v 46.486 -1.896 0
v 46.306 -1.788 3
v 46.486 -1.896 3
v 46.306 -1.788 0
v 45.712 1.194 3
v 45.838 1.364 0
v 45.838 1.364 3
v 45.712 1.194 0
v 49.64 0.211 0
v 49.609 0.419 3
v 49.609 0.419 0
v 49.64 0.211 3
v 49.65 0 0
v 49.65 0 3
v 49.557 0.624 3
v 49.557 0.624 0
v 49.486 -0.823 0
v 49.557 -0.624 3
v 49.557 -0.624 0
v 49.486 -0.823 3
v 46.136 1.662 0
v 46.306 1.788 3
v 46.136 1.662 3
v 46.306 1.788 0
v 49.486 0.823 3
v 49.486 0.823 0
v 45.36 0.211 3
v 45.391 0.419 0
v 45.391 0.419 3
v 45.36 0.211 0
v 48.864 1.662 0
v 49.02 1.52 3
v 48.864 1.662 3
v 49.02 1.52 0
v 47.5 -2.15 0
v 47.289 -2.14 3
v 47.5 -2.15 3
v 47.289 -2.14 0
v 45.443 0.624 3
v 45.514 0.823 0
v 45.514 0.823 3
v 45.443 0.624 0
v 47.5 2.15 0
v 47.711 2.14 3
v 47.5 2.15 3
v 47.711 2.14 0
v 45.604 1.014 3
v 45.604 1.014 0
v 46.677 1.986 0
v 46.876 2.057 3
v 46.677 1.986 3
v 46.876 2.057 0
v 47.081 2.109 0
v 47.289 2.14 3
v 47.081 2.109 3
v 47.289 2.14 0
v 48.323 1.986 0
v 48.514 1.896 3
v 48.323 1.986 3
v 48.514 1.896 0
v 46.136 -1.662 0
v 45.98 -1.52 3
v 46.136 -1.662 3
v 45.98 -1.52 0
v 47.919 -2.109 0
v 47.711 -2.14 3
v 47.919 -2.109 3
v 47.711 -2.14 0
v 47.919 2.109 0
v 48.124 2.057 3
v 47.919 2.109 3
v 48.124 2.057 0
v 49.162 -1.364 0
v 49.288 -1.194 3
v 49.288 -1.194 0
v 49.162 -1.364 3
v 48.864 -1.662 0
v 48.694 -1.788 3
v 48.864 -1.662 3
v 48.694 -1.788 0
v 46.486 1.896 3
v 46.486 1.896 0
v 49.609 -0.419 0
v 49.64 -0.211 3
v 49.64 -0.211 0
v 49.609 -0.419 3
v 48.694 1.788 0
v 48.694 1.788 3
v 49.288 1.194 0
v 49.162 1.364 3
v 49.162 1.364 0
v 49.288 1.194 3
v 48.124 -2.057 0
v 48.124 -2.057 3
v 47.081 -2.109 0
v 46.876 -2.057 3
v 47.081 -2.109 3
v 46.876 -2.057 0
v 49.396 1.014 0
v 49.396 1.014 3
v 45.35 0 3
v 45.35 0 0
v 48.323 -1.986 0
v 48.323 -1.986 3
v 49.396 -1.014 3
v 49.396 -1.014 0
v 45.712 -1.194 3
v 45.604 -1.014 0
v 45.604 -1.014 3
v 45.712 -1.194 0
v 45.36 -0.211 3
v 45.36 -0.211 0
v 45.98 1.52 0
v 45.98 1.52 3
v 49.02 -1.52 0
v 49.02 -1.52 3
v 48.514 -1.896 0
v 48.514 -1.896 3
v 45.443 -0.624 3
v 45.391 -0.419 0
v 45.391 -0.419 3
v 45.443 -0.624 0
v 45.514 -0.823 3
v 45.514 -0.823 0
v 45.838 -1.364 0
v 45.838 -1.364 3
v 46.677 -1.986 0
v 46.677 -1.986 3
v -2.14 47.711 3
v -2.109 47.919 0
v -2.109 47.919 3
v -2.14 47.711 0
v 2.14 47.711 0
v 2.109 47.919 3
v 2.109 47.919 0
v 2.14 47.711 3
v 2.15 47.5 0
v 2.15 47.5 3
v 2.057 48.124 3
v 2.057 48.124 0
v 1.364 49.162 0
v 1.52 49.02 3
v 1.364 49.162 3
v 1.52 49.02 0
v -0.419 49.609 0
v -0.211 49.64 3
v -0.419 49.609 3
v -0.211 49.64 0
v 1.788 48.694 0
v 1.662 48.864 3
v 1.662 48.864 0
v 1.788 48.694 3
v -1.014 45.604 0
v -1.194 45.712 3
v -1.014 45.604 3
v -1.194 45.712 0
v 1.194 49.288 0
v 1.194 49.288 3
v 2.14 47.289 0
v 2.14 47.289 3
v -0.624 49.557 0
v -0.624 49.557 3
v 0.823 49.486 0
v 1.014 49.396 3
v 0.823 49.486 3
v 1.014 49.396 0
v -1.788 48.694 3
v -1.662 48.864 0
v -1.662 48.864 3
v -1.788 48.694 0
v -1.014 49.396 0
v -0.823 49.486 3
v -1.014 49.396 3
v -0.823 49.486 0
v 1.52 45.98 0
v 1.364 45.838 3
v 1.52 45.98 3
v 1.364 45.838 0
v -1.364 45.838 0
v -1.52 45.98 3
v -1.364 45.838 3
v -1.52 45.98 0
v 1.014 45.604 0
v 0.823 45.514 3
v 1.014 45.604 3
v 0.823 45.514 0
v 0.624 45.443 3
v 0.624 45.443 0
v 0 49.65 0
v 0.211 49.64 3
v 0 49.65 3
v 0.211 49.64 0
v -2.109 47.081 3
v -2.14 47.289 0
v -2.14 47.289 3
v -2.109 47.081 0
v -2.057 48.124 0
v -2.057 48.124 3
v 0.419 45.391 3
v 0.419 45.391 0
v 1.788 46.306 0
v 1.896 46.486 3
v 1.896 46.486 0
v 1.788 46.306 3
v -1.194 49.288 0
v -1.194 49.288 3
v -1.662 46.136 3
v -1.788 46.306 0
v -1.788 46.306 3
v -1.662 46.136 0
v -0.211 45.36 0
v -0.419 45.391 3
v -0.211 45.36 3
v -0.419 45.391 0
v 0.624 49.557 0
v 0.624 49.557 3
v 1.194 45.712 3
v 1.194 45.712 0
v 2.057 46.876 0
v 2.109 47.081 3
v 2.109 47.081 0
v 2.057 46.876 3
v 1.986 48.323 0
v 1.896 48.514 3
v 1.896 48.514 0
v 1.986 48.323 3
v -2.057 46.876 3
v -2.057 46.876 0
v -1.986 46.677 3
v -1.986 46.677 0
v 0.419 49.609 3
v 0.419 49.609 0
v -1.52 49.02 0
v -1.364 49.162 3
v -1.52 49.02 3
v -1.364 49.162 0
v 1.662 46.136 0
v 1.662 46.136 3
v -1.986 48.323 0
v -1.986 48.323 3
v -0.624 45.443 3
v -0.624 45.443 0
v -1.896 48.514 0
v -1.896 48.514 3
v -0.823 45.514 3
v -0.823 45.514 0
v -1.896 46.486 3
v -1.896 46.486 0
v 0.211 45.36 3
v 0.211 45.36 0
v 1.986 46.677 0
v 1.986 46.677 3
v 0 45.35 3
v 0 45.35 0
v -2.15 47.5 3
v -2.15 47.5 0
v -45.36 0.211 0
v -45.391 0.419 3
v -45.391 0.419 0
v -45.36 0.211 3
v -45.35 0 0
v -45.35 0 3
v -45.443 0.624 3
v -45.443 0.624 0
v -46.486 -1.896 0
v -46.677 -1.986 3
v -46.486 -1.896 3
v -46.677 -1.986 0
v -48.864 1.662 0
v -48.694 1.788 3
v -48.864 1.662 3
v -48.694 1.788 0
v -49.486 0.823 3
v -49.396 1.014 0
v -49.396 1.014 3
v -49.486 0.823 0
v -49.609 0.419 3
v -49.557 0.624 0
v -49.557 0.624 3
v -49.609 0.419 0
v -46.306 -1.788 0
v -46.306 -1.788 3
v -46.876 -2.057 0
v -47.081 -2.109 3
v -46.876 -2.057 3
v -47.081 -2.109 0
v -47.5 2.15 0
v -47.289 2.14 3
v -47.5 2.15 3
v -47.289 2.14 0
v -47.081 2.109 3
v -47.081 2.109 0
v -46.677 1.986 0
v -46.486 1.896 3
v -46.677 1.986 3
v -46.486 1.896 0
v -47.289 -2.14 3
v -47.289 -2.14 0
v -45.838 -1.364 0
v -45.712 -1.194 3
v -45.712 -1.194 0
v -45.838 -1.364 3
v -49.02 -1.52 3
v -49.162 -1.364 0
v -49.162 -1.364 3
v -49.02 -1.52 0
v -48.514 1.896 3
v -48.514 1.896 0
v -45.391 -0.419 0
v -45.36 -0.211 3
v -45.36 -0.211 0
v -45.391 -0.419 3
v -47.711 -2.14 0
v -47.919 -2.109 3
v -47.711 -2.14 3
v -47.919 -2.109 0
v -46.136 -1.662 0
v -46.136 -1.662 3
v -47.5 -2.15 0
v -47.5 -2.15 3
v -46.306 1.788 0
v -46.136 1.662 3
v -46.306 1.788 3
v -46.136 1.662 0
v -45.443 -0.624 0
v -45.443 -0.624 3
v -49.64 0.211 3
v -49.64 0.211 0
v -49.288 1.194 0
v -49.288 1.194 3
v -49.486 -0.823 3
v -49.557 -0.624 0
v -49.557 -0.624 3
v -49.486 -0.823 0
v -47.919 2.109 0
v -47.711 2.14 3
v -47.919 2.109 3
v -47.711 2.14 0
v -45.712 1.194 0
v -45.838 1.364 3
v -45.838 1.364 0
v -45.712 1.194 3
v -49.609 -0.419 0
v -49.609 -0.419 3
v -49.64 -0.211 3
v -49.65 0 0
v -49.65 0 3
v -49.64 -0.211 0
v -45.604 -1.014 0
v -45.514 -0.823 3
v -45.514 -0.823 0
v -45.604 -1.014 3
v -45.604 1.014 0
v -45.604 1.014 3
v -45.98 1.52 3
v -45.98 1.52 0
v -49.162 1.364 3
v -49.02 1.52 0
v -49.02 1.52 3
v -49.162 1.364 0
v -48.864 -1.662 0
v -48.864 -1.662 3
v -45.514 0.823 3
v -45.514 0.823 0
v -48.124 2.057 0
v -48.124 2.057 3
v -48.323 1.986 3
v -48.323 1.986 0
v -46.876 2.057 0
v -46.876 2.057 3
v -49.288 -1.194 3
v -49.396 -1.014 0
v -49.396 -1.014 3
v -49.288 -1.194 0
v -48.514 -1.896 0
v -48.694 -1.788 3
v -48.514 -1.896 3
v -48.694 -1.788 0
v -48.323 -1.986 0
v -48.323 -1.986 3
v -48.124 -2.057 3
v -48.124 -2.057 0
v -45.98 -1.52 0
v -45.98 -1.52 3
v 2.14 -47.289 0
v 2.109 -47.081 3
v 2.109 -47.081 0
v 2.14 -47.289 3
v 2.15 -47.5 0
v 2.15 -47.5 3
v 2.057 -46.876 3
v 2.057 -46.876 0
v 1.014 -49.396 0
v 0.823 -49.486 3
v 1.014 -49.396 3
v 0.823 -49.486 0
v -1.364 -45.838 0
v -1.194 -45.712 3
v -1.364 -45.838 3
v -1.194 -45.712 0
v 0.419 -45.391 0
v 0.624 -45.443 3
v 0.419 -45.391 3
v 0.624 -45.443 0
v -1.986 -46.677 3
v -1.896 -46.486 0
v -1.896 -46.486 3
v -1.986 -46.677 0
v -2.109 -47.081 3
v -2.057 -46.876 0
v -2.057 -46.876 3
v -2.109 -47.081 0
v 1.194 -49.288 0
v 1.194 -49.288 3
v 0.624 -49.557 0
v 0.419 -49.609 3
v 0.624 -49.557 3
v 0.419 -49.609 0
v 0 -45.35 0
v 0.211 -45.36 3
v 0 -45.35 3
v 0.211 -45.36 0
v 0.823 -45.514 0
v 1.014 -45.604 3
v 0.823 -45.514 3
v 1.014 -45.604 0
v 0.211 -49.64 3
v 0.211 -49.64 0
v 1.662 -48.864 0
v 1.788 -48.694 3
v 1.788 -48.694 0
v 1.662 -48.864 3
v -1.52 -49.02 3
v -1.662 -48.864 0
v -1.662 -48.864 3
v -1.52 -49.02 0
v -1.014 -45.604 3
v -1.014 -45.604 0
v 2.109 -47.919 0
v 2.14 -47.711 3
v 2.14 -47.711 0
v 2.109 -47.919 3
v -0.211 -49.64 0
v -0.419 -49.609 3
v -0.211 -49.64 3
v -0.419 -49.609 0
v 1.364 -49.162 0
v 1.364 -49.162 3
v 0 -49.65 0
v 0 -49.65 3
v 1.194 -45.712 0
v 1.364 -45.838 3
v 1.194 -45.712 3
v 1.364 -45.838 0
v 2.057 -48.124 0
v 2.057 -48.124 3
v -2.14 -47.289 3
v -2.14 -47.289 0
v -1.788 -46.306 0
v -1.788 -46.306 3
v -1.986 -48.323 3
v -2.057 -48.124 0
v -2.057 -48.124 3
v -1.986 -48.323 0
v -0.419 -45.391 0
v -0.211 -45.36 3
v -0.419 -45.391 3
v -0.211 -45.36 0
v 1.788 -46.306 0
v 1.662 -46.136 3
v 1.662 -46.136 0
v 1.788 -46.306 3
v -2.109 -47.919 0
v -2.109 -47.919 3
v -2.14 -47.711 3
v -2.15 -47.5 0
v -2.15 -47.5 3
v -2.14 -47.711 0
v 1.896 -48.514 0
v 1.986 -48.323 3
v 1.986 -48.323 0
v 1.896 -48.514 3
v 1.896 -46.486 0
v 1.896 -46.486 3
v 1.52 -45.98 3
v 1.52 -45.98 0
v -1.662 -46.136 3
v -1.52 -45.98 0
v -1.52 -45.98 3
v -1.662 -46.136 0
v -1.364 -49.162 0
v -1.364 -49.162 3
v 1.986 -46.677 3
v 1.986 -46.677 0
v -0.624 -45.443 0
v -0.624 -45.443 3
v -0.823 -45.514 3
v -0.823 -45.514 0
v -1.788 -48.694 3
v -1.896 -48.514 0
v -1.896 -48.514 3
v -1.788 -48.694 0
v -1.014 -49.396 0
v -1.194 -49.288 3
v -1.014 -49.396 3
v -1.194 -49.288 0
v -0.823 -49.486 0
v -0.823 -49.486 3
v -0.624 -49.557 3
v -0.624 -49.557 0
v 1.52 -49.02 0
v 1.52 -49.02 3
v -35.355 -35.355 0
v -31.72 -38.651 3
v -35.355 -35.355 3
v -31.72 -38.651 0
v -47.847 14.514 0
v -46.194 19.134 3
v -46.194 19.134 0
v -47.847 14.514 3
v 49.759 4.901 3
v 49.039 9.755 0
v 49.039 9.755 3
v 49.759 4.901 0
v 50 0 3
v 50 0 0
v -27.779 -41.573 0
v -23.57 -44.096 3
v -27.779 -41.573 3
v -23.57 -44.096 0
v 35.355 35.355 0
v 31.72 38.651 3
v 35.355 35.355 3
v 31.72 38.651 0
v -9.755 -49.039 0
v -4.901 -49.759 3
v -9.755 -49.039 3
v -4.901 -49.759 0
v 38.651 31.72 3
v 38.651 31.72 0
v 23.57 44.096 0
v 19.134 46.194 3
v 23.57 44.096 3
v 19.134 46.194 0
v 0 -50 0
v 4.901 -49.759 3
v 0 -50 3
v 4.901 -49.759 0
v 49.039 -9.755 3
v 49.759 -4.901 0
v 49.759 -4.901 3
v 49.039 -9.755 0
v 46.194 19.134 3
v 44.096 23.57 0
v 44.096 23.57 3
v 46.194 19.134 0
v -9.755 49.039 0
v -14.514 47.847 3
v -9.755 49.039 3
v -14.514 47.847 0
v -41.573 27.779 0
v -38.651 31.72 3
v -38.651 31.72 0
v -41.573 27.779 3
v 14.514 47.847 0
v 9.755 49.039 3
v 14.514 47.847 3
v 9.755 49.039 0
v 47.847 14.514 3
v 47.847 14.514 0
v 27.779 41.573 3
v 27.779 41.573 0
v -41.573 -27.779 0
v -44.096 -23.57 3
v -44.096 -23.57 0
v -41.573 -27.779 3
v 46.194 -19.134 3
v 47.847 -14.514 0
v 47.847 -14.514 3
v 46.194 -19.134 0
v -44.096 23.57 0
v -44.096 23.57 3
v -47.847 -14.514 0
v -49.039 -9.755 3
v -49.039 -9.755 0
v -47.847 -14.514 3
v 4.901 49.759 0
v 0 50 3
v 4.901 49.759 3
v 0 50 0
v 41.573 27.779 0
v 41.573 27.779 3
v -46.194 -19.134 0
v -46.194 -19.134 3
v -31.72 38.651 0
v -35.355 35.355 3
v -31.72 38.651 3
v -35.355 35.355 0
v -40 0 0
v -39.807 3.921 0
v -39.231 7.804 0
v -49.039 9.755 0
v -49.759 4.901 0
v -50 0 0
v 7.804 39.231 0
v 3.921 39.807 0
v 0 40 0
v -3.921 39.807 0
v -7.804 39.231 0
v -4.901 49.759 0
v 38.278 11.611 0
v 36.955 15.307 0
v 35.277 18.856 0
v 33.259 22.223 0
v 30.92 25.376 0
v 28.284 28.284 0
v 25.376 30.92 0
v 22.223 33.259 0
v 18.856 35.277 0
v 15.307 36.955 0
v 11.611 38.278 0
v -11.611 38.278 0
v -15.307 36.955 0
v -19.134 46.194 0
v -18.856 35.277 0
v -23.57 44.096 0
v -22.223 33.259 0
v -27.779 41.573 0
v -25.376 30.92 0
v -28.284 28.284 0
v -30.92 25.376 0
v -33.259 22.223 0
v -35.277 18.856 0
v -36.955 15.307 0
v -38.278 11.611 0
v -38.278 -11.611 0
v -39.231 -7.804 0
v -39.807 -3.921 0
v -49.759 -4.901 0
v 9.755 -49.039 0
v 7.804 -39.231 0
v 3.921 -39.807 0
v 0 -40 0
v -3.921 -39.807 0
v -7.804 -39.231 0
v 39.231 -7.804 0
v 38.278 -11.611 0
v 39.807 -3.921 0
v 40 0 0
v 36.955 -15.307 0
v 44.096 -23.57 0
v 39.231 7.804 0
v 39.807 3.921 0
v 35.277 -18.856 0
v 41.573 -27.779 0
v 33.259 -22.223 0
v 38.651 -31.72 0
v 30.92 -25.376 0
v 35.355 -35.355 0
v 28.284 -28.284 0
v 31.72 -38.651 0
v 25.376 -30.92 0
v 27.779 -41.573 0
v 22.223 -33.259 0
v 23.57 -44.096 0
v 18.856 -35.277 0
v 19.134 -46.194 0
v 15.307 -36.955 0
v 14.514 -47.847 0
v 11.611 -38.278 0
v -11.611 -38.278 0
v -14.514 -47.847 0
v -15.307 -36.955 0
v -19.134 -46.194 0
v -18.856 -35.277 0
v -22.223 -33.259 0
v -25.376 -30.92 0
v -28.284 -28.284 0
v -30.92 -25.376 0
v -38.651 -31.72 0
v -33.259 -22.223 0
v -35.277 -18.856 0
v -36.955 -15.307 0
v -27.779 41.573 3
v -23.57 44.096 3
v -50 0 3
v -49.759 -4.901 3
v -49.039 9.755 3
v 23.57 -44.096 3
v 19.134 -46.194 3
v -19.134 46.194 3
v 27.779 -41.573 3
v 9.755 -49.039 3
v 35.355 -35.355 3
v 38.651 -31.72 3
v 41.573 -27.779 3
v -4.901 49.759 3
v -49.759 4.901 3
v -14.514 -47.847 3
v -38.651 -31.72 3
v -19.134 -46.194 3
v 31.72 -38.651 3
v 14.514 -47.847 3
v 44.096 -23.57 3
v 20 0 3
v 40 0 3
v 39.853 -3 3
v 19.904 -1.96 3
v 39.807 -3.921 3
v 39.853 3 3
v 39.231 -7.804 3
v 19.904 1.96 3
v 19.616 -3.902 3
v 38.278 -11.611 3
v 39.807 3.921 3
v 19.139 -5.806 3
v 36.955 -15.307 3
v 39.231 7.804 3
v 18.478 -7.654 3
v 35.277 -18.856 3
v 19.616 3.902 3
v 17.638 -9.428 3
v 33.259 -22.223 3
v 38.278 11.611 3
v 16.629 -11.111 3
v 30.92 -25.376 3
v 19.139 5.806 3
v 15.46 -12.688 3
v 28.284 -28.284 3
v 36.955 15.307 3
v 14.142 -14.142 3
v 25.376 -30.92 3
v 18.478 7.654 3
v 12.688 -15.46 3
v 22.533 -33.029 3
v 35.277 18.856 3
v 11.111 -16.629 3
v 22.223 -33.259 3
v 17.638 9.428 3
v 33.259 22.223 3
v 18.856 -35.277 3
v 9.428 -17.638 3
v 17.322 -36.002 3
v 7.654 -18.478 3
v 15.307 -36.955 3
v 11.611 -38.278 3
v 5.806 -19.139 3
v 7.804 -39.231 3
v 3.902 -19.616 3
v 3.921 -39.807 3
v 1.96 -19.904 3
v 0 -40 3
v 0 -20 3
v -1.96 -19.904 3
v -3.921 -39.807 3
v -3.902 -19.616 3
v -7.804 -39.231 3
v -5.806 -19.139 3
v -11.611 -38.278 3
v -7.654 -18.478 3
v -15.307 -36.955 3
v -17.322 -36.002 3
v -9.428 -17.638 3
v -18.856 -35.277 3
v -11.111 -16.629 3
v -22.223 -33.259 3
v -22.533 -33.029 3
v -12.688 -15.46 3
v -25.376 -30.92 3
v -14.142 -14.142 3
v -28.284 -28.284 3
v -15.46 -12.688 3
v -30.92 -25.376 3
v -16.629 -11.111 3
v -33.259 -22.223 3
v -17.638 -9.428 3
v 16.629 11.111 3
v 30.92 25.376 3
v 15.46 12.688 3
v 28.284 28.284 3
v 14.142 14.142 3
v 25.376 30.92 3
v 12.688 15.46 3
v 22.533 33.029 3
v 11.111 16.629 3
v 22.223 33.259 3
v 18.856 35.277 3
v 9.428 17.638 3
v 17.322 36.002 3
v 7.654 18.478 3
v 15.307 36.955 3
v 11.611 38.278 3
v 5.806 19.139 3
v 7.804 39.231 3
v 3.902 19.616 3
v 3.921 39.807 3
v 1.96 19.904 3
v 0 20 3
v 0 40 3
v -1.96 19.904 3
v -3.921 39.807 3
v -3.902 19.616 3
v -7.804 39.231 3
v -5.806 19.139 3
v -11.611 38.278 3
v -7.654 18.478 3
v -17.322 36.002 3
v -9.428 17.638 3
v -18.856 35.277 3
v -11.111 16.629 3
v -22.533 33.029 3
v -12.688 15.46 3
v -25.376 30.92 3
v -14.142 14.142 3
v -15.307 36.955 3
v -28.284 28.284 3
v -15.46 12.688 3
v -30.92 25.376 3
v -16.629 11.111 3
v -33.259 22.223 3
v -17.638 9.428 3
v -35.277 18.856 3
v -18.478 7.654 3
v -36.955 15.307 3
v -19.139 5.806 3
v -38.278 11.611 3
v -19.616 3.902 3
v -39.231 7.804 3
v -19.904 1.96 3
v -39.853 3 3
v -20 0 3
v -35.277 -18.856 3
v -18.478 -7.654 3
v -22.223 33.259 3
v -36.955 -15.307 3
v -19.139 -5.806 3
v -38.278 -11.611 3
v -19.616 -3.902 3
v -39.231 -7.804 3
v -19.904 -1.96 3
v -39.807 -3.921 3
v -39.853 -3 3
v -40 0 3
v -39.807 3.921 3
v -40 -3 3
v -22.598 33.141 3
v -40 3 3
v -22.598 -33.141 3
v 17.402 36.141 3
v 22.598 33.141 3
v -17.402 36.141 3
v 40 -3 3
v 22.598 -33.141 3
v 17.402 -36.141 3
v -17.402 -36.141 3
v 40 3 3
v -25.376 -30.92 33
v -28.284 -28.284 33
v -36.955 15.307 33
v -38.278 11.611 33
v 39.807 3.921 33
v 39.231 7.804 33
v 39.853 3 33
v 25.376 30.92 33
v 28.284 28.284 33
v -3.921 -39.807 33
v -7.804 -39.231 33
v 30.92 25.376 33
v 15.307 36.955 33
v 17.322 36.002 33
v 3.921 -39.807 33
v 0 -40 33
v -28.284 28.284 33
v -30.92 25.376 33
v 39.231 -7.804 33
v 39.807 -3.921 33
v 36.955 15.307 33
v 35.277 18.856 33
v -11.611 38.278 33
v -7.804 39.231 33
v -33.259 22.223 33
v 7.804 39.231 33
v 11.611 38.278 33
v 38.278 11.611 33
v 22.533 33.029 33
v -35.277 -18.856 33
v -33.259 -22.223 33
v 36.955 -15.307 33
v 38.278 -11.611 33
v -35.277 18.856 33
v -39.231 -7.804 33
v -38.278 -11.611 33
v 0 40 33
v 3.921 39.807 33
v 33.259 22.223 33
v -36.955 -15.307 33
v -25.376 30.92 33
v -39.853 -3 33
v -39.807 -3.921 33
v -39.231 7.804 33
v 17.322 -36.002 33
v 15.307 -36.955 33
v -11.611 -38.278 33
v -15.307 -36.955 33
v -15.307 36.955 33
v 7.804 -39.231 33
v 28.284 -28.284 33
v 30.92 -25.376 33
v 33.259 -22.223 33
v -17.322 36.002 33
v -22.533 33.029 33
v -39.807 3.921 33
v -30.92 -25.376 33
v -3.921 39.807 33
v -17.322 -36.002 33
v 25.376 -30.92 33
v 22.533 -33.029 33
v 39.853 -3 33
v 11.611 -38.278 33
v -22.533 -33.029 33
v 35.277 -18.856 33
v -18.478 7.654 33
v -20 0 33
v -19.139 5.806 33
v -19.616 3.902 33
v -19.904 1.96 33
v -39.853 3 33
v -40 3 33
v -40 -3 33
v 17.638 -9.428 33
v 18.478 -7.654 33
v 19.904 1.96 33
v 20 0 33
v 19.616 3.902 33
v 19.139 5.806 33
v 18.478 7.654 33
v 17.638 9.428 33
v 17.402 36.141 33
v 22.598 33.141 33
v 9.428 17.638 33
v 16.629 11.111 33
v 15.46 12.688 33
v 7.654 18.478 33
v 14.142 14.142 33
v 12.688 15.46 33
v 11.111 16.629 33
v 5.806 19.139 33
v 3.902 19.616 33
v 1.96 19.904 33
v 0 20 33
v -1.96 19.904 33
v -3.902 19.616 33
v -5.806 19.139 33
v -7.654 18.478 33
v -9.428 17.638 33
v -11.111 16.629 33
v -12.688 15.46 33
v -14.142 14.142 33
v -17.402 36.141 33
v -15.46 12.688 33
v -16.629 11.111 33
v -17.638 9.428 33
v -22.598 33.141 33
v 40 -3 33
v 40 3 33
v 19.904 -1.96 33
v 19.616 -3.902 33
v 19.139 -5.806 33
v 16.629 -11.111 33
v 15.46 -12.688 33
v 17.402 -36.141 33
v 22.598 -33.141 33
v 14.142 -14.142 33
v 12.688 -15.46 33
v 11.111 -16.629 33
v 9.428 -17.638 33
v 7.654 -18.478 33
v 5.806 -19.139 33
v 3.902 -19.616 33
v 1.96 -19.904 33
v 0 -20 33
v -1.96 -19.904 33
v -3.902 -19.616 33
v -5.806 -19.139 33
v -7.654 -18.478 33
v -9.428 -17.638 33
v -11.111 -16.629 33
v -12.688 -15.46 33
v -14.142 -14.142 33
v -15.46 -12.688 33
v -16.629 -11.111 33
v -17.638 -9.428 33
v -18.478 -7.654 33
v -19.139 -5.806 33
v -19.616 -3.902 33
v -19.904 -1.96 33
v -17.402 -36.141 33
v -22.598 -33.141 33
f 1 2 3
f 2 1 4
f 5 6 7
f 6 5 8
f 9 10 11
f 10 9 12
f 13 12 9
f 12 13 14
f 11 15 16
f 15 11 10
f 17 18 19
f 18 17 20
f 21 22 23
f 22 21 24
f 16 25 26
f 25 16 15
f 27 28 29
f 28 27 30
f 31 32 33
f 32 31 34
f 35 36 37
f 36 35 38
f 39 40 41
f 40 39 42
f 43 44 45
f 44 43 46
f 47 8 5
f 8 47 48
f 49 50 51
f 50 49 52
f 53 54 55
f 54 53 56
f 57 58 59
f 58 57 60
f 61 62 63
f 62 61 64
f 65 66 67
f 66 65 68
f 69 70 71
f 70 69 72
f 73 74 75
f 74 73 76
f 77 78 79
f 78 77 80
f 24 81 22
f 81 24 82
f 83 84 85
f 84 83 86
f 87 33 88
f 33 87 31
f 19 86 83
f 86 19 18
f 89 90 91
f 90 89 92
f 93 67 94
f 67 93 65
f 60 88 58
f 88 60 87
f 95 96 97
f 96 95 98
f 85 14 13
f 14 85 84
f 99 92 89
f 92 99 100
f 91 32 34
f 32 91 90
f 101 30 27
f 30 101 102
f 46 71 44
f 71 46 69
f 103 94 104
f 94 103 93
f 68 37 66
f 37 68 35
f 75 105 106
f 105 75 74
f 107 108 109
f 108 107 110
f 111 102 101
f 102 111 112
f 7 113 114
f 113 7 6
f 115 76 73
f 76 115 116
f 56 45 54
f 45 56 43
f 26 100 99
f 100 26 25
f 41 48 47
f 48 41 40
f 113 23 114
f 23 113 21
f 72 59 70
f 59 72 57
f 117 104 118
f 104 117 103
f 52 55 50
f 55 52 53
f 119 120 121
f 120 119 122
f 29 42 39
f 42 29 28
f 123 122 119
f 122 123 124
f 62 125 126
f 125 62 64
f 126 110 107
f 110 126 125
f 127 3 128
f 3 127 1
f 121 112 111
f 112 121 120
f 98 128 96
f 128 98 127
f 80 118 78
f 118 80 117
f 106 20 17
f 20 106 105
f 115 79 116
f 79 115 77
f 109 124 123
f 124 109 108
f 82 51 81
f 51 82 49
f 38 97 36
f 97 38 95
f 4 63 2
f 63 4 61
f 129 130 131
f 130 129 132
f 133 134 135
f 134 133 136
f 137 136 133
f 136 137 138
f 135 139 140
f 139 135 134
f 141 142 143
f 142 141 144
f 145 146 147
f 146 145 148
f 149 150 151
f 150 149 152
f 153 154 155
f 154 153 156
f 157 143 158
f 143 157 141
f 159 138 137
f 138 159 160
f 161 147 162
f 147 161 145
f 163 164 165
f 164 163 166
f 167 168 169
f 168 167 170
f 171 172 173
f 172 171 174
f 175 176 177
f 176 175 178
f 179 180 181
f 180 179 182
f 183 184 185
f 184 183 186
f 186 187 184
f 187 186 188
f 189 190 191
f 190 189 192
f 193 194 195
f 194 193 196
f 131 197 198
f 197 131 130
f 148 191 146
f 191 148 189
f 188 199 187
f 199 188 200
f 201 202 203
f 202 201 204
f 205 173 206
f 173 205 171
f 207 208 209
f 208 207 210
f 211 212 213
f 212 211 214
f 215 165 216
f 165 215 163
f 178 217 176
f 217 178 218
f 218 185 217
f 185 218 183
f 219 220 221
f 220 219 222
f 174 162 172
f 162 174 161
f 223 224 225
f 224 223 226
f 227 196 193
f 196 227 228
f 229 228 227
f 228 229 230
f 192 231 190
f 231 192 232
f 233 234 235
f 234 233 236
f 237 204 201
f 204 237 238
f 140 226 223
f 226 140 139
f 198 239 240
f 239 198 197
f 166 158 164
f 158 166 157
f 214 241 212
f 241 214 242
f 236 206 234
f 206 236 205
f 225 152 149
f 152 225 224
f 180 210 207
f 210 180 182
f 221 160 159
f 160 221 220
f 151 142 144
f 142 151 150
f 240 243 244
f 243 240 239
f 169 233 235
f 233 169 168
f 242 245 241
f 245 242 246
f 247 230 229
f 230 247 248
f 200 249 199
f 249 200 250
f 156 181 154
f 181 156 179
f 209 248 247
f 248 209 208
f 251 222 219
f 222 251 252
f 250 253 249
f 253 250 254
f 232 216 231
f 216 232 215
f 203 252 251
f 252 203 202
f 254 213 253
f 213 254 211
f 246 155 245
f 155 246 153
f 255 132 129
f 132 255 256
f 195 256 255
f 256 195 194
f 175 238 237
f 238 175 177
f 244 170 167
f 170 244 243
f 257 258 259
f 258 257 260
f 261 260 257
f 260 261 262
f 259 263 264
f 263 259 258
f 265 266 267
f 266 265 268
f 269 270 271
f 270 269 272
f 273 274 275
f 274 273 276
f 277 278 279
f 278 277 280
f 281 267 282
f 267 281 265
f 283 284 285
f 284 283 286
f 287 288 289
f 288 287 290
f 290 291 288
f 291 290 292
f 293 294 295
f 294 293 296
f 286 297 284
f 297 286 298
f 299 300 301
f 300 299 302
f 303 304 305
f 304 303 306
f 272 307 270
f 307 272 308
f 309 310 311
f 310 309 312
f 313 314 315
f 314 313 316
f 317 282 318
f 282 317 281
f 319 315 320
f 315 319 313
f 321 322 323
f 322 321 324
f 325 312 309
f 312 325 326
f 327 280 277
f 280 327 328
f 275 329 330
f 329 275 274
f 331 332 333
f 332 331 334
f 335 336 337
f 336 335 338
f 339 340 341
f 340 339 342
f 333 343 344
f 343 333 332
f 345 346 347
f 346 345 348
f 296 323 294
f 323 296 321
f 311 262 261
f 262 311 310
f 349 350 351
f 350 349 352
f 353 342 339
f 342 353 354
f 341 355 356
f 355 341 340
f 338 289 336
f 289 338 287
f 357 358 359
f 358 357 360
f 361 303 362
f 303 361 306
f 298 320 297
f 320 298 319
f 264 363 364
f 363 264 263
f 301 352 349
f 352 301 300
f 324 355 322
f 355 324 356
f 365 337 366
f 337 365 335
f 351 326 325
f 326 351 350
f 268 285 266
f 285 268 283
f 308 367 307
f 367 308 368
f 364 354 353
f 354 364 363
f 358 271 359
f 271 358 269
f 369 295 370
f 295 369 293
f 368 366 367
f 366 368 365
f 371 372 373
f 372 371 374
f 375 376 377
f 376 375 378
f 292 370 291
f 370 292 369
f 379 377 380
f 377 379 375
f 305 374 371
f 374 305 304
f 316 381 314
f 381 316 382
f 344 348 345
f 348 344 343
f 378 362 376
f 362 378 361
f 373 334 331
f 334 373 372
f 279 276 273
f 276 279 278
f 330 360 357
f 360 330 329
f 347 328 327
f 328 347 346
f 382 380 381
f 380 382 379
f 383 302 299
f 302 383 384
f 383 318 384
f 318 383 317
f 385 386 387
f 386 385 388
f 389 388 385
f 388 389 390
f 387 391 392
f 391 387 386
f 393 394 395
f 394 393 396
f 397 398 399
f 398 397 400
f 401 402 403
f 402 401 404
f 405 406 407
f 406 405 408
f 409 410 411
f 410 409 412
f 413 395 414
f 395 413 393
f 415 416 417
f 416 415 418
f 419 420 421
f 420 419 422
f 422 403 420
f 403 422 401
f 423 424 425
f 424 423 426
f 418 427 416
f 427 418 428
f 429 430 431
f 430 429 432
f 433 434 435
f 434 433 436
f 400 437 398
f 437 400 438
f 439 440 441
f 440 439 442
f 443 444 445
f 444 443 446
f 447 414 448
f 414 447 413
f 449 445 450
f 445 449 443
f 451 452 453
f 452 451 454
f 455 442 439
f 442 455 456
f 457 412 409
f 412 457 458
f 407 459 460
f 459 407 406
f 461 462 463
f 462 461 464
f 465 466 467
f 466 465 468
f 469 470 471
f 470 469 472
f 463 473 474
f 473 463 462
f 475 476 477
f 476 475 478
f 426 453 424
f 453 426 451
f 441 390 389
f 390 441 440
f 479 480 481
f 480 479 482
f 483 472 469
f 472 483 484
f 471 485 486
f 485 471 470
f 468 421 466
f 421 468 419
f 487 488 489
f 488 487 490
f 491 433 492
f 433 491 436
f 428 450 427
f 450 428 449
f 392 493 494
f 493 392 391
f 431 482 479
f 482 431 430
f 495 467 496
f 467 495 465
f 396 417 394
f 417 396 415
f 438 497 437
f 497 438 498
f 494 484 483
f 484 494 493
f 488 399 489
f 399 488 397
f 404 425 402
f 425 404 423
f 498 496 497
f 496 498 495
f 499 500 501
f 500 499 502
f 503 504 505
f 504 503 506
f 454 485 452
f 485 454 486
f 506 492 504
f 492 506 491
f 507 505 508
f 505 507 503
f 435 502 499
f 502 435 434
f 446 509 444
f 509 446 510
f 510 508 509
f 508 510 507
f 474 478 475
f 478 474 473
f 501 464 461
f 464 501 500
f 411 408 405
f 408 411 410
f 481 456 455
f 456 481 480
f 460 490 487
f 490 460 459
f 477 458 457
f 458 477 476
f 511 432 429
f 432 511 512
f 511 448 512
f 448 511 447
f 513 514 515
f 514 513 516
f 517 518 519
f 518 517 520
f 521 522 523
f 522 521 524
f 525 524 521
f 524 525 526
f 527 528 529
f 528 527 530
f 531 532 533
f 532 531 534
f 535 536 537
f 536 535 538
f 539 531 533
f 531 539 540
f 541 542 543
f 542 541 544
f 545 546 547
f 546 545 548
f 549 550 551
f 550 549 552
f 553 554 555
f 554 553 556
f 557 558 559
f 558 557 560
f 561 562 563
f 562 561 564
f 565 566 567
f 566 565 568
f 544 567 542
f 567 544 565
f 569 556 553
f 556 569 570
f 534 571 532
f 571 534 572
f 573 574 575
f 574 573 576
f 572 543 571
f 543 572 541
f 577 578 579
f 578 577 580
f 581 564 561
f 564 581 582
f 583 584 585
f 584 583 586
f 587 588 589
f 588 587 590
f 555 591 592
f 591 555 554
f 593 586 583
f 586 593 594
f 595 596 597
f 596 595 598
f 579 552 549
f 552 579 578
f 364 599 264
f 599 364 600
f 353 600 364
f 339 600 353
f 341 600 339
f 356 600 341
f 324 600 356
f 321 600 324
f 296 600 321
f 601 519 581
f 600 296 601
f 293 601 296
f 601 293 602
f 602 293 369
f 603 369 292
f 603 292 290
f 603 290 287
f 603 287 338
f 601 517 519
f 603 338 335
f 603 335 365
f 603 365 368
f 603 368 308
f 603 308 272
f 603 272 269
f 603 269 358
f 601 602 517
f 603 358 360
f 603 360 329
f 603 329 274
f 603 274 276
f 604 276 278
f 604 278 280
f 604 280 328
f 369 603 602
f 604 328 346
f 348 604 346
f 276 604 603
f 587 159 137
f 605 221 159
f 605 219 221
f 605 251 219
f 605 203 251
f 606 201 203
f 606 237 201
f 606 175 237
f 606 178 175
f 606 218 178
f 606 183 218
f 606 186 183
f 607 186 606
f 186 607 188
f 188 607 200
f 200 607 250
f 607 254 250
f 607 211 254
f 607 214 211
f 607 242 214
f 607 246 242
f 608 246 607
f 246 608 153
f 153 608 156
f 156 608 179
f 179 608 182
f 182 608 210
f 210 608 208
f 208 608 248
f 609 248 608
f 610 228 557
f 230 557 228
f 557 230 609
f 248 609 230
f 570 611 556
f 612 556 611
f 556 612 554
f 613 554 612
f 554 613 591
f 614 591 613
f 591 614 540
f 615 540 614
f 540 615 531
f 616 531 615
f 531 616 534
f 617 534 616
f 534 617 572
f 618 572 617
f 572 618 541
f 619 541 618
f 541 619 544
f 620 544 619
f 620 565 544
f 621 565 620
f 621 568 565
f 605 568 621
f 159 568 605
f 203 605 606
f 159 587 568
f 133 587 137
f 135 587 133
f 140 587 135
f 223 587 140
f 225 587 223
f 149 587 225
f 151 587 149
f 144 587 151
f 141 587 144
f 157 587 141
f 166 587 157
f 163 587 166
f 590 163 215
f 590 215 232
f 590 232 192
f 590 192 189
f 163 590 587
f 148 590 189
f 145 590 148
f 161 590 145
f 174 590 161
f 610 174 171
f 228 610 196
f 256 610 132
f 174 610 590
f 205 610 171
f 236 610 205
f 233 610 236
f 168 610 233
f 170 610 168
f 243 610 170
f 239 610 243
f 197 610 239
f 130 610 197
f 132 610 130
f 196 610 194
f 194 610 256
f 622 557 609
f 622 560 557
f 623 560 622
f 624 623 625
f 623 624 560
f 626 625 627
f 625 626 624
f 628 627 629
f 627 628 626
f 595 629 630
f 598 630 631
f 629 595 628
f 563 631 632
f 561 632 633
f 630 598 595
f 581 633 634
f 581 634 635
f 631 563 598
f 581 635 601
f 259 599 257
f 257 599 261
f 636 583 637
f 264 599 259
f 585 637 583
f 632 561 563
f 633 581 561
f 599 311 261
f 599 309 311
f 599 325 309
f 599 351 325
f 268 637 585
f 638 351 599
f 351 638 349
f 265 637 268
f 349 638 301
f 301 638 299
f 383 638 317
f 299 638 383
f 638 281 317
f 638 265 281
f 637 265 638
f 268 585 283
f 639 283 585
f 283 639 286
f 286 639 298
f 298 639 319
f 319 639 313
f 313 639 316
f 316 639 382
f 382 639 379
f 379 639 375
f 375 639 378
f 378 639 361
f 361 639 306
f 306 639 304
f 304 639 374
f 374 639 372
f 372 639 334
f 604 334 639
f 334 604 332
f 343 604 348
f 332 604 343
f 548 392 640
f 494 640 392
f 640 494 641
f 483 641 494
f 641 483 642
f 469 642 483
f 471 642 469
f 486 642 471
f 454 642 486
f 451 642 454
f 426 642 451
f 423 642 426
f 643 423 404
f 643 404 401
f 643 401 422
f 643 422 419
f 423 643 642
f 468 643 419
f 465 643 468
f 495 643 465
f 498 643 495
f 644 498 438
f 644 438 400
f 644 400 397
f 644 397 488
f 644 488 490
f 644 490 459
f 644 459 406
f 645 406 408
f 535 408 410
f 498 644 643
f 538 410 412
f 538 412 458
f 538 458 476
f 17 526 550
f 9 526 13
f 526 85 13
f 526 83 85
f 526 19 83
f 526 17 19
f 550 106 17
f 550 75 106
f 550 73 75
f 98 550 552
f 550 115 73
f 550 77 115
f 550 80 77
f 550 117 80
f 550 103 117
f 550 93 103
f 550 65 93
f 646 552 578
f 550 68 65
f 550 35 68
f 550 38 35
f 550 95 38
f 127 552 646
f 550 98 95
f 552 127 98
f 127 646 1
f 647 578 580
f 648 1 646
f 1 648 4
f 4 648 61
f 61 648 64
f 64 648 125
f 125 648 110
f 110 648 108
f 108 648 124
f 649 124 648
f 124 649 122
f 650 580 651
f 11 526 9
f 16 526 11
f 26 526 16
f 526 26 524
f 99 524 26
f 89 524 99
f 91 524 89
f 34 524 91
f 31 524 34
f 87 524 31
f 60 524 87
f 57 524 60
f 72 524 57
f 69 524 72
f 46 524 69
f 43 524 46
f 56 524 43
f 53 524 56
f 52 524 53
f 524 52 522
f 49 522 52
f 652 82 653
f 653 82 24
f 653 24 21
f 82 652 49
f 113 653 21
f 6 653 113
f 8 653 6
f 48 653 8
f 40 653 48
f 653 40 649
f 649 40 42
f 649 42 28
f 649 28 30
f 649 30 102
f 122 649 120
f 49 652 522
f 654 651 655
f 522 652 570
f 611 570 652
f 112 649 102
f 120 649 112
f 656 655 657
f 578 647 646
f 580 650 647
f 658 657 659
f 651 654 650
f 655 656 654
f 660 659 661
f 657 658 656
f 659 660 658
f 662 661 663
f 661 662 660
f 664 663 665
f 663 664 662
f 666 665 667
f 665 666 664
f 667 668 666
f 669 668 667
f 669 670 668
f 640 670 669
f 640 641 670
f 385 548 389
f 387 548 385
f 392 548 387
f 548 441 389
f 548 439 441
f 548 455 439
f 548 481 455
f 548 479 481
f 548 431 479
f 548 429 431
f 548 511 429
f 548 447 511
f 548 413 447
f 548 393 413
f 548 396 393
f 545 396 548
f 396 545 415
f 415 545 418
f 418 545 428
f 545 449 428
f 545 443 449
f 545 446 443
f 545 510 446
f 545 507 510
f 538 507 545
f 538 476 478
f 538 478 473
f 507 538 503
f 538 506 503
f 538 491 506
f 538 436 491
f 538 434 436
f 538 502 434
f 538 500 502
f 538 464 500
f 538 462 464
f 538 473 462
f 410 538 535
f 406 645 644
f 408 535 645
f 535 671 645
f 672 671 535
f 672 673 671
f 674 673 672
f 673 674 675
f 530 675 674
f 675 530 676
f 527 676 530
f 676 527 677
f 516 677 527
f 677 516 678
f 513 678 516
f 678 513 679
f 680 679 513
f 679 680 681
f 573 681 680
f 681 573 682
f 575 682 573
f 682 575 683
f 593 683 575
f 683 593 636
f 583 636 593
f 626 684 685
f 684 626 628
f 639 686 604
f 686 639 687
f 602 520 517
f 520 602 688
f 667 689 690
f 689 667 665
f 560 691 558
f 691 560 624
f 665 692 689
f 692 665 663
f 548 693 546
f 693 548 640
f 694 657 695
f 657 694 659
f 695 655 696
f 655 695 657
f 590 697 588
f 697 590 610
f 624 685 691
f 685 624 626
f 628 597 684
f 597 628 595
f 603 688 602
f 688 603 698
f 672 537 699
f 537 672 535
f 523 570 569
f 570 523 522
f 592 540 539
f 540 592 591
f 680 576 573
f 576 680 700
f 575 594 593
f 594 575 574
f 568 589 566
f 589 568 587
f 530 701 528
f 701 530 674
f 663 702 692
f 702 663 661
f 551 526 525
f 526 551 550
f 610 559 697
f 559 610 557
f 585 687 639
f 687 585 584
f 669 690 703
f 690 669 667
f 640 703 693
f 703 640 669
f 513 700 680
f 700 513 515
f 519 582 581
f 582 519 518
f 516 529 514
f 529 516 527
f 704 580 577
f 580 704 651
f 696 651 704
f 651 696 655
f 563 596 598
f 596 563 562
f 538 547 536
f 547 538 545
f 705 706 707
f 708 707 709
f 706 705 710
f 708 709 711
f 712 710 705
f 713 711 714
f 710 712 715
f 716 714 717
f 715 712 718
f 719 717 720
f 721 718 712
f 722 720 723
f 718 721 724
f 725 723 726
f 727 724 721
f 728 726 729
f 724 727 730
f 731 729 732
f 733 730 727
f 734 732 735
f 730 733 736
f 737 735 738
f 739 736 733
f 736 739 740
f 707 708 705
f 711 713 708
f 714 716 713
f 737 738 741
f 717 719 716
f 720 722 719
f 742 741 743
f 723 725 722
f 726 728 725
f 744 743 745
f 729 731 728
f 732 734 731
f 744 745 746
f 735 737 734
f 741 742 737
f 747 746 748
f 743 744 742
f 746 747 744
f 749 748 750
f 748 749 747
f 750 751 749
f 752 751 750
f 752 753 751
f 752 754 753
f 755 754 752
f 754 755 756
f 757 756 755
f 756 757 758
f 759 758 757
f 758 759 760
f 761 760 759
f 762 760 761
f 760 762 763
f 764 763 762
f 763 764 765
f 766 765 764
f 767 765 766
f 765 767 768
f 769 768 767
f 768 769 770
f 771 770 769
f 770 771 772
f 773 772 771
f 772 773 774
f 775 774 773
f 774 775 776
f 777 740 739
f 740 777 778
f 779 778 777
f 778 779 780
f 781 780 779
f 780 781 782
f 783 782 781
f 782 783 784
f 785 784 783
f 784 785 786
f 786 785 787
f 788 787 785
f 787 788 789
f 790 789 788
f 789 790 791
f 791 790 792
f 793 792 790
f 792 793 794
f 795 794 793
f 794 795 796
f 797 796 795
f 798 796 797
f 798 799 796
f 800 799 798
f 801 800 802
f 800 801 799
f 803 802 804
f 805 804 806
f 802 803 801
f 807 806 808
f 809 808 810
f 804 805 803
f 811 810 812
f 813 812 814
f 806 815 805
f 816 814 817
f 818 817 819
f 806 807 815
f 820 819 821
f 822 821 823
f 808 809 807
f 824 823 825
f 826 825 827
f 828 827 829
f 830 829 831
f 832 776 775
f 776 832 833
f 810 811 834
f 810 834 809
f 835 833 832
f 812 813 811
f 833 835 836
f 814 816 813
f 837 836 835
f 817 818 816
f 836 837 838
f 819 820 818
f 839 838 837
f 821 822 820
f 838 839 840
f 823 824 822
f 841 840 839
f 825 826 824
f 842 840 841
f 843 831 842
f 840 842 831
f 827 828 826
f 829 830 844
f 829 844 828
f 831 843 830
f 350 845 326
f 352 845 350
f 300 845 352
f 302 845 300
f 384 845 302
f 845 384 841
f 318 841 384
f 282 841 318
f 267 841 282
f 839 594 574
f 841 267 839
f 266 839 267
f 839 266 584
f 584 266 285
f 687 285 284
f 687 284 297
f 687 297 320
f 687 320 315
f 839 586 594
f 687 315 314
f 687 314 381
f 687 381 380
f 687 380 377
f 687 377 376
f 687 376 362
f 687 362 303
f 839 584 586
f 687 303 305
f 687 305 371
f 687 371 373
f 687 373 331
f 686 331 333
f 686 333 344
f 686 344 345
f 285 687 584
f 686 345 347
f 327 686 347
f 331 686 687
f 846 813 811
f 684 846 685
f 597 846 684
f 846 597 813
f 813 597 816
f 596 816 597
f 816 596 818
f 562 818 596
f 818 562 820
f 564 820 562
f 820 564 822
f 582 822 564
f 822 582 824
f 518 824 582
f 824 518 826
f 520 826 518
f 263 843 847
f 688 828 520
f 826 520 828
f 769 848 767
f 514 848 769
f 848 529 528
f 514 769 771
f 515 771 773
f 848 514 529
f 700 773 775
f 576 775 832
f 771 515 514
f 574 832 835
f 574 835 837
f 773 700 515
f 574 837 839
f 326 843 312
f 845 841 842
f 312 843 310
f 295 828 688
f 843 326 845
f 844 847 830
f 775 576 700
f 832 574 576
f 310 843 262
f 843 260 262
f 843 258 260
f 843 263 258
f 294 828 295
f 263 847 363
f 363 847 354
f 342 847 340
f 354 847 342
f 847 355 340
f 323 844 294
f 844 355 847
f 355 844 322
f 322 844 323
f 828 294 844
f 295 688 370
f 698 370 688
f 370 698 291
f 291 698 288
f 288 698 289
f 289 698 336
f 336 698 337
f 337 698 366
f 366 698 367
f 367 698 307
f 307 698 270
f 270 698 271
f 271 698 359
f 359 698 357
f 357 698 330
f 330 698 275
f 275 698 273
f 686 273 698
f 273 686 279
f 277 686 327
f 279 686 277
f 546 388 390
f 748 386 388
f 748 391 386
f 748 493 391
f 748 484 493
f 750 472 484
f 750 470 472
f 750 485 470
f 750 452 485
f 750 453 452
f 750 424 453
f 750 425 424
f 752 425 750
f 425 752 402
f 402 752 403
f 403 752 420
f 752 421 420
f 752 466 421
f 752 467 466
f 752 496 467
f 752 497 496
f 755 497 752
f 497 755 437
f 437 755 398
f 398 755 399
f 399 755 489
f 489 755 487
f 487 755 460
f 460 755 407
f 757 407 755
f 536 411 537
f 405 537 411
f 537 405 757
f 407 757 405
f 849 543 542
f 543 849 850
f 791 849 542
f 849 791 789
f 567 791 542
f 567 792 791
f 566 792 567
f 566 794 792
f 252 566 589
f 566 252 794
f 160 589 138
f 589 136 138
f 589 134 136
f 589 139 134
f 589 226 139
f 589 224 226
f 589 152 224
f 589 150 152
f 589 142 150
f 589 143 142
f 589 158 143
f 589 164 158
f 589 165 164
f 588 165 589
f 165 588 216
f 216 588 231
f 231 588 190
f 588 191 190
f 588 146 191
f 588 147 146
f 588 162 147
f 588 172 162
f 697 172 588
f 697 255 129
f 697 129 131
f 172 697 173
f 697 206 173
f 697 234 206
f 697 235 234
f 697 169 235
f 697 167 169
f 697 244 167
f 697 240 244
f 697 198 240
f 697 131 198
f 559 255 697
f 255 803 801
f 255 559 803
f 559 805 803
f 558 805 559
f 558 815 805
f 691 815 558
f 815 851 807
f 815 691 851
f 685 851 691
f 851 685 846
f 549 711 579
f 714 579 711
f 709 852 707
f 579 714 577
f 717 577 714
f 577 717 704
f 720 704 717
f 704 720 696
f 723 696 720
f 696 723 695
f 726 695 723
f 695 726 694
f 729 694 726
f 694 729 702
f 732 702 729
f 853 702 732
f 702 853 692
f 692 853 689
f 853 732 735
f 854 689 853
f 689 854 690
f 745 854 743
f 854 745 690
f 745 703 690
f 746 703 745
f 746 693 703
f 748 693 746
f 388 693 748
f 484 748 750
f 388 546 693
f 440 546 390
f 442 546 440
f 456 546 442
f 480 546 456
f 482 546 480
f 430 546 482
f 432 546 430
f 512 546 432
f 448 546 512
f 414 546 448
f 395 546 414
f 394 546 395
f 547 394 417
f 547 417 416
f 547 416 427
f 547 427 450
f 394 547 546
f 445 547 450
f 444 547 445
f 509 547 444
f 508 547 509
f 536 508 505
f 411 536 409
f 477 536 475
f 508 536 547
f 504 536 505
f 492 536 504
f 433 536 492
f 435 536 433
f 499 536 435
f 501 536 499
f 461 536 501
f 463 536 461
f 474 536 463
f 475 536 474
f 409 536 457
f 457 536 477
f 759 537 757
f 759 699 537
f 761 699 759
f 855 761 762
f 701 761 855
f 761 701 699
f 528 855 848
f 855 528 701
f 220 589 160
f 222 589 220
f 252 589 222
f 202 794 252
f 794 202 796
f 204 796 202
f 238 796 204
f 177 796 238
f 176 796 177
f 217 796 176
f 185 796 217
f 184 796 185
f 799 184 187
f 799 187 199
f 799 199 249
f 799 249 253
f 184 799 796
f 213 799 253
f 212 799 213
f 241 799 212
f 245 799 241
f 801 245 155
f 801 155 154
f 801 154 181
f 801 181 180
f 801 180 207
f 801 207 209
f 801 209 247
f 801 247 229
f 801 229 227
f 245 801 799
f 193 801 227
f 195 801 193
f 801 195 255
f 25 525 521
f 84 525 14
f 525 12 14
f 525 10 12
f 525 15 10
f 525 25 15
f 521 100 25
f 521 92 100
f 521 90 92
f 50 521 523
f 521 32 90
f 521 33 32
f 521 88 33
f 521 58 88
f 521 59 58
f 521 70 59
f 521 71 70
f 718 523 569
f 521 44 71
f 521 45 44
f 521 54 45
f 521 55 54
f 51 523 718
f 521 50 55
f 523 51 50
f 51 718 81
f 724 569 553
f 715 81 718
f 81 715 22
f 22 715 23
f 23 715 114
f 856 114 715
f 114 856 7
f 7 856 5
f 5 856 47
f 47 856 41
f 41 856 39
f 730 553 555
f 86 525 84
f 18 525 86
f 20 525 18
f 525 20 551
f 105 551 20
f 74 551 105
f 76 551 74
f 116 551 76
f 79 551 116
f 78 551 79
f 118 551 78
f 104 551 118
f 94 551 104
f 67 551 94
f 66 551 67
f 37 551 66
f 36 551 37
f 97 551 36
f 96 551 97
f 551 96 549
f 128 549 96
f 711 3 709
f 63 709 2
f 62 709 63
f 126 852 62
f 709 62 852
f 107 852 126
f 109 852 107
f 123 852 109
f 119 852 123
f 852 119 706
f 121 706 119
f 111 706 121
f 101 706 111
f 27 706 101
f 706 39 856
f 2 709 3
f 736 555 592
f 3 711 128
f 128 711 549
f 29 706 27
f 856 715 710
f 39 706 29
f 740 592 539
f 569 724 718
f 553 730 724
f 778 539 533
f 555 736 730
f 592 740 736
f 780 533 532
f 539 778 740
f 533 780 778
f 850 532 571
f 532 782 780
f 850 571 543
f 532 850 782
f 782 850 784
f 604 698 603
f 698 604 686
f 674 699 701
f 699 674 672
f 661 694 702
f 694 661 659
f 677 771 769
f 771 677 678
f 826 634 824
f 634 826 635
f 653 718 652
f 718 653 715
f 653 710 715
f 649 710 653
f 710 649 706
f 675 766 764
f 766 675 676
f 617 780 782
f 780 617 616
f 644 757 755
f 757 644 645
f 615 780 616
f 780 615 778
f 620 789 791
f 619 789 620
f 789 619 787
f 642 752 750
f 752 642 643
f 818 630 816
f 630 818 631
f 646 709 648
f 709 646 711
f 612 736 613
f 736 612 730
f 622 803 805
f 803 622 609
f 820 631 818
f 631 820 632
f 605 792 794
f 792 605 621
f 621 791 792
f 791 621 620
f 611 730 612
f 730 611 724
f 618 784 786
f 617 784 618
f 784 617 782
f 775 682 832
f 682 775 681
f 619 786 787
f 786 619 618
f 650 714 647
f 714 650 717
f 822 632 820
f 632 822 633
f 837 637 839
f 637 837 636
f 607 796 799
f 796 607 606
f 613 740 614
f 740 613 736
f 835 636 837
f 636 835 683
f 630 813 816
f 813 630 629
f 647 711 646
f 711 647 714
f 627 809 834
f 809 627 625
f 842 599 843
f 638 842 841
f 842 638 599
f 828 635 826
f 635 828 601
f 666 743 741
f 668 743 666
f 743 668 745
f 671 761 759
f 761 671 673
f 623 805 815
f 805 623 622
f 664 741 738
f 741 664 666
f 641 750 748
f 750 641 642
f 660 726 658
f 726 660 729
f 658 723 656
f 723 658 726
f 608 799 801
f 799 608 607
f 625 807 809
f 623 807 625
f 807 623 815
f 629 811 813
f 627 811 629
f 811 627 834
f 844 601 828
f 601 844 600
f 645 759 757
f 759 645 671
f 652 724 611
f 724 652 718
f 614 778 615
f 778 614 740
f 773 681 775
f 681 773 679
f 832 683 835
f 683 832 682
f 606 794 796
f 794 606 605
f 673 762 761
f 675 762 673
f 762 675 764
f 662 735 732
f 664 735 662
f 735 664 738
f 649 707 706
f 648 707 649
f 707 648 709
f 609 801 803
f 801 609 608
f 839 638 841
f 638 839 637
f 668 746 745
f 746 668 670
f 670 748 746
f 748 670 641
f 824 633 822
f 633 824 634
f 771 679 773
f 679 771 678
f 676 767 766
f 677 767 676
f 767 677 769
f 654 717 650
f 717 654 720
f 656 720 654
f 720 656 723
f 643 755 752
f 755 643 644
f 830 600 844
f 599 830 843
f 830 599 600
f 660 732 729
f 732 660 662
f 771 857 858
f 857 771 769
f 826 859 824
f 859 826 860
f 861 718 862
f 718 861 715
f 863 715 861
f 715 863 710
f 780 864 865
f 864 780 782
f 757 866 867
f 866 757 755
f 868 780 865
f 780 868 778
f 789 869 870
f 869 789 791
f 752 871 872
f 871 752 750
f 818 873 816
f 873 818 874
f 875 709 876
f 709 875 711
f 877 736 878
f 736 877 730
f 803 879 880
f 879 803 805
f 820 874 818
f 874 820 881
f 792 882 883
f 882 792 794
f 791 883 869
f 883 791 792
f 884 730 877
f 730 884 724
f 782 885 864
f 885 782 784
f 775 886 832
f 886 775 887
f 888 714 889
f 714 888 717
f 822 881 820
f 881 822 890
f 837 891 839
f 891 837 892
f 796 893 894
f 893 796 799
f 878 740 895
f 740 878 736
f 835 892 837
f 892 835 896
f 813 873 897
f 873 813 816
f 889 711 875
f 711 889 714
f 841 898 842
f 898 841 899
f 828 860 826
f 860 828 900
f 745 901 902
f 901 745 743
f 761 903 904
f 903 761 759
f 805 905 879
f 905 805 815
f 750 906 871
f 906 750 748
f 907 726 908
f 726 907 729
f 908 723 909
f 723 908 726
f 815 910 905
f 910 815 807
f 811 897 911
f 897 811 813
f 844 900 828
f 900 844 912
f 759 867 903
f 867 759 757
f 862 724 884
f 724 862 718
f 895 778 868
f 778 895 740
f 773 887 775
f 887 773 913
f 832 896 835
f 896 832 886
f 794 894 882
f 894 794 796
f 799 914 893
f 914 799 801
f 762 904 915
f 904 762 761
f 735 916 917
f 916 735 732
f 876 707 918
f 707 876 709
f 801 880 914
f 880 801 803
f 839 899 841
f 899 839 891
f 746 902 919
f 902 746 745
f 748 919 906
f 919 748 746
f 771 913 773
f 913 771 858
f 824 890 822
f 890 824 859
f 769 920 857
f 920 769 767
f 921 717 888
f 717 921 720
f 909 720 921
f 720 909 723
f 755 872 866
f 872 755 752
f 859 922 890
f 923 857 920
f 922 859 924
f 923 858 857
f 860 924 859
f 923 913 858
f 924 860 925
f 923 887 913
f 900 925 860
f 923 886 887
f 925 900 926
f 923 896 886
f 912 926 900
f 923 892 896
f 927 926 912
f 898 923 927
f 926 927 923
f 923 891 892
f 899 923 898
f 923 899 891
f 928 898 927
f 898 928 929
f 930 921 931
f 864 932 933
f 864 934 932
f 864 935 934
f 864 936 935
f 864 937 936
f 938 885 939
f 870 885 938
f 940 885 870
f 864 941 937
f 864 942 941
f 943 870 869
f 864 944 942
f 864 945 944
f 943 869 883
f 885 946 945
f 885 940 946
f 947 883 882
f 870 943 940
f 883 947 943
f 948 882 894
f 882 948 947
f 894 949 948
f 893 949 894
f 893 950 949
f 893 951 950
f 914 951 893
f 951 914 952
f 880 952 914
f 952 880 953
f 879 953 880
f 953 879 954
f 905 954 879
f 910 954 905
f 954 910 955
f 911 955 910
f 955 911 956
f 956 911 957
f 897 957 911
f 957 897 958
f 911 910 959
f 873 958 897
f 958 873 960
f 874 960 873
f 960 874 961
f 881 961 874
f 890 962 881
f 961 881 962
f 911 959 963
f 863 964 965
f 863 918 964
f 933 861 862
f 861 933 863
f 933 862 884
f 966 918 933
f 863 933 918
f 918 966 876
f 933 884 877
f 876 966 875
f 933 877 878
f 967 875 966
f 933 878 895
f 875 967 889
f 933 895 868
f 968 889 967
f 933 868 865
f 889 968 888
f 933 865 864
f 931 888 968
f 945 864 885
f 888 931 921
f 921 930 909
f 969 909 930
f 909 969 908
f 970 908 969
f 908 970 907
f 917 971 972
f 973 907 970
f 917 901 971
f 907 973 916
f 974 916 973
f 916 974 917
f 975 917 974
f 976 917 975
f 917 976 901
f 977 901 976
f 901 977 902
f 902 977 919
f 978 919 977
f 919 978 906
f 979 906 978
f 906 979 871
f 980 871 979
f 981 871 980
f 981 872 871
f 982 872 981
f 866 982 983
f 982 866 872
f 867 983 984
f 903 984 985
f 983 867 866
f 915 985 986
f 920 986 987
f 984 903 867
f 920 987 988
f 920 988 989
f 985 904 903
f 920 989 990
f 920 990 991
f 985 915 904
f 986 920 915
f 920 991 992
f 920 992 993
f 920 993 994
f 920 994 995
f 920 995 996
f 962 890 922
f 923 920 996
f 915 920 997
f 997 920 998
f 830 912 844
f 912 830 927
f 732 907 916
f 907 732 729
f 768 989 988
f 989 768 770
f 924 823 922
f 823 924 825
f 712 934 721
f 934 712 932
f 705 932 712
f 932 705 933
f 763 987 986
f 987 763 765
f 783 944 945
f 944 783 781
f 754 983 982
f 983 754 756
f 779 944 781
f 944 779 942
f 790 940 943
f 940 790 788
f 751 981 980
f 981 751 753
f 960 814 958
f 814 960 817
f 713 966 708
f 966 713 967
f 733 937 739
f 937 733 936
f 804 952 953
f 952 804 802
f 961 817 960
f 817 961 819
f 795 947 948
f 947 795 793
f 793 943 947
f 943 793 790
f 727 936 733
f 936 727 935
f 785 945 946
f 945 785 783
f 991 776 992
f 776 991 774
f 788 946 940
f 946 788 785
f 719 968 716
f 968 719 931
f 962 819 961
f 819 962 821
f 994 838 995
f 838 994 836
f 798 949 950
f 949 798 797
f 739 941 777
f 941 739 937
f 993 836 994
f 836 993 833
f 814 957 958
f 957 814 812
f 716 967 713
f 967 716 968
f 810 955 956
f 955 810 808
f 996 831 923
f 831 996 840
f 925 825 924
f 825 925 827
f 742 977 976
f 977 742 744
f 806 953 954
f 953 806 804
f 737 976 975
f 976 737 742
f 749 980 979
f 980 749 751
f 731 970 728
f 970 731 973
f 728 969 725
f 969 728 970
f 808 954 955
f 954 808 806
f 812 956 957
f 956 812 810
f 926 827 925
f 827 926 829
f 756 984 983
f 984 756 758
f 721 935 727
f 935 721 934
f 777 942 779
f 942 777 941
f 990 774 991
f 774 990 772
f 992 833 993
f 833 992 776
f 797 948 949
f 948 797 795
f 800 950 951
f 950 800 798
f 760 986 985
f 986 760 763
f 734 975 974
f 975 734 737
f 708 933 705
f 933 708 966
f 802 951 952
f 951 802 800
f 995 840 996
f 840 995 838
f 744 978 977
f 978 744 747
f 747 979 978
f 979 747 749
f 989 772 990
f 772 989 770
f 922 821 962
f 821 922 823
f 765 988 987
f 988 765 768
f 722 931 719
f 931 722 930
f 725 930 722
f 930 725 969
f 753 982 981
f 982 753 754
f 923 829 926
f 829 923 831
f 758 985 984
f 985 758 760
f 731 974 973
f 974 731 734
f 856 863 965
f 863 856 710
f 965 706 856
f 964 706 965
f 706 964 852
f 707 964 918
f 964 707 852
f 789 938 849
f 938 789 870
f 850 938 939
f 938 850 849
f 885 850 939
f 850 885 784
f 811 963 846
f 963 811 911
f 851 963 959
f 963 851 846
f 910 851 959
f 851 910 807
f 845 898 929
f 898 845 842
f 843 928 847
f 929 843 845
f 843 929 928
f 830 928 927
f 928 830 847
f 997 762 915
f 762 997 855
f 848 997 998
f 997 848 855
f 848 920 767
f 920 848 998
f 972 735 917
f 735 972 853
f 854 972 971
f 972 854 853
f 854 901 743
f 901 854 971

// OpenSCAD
// ab_flameholder.scad — Annular V-gutter flame holder with stabilizer arms
// All dimensions in mm.

// ===== PARAMETERS =====
outer_od    = 80.0;   // Outer V-gutter outer diameter
inner_id    = 40.0;   // Inner V-gutter inner diameter
v_angle     = 45;     // V-gutter half-angle (degrees); included = 90
radial_h    = 15.0;   // Radial height of V-gutter vane
section_len = 30.0;   // Axial length
wall_t      = 1.5;    // Material thickness (Inconel 625)
n_arms      = 6;      // Number of radial stabilizer arms
arm_width   = 6.0;    // Width of each radial arm
glowplug_d  = 10.0;   // Glow plug threaded hole (M10x1.0)

// Flanges (match transition outlet)
flg_od      = 100.0;  // Flange OD
flg_t       = 3.0;    // Flange thickness
pcd         = 95.0;   // Bolt PCD
bolt_dia    = 4.3;    // M4 clearance hole
n_bolts     = 4;      // Number of bolts

$fn = 64;

module v_gutter_profile() {
    // V-gutter: V opening upstream. Cross-section in (r,z) plane.
    apex_r  = (inner_id/2 + outer_od/2) / 2;
    apex_z  = section_len / 2;
    poly_points = [
        [inner_id/2, 0],
        [inner_id/2 + radial_h, apex_z],
        [inner_id/2 + radial_h, apex_z],
        [outer_od/2 - radial_h, apex_z],
        [outer_od/2 - radial_h, apex_z],
        [outer_od/2, 0]
    ];
    polygon(poly_points);
}

module v_gutter_ring() {
    rotate_extrude()
        v_gutter_profile();
}

module mounting_flange() {
    difference() {
        cylinder(d=flg_od, h=flg_t);
        translate([0, 0, -0.01])
            cylinder(d=outer_od, h=flg_t + 0.02);
        for (i = [0 : n_bolts - 1]) {
            angle = i * 360 / n_bolts;
            translate([pcd/2 * cos(angle), pcd/2 * sin(angle), -0.01])
                cylinder(d=bolt_dia, h=flg_t + 0.02);
        }
    }
}

module radial_arms() {
    for (i = [0 : n_arms - 1]) {
        rotate([0, 0, i * 360 / n_arms])
        translate([inner_id/2, -arm_width/2, 0])
        linear_extrude(height=section_len)
            square([(outer_od - inner_id)/2, arm_width]);
    }
}

module glow_plug_mount() {
    // Mounted in the wake of radial arm 0
    rotate([0, 0, 0])
    translate([(inner_id + outer_od)/4, 0, section_len/2])
    rotate([0, 90, 0])
    union() {
        cylinder(d=14.0, h=8.0);
        translate([0, 0, -0.01])
            cylinder(d=glowplug_d, h=8.02);
    }
}

mounting_flange();

translate([0, 0, flg_t])
union() {
    difference() {
        cylinder(h=section_len, d=outer_od);
        cylinder(h=section_len, d=inner_id);
        v_gutter_ring();
    }
    radial_arms();
}

translate([0, 0, flg_t])
    glow_plug_mount();
